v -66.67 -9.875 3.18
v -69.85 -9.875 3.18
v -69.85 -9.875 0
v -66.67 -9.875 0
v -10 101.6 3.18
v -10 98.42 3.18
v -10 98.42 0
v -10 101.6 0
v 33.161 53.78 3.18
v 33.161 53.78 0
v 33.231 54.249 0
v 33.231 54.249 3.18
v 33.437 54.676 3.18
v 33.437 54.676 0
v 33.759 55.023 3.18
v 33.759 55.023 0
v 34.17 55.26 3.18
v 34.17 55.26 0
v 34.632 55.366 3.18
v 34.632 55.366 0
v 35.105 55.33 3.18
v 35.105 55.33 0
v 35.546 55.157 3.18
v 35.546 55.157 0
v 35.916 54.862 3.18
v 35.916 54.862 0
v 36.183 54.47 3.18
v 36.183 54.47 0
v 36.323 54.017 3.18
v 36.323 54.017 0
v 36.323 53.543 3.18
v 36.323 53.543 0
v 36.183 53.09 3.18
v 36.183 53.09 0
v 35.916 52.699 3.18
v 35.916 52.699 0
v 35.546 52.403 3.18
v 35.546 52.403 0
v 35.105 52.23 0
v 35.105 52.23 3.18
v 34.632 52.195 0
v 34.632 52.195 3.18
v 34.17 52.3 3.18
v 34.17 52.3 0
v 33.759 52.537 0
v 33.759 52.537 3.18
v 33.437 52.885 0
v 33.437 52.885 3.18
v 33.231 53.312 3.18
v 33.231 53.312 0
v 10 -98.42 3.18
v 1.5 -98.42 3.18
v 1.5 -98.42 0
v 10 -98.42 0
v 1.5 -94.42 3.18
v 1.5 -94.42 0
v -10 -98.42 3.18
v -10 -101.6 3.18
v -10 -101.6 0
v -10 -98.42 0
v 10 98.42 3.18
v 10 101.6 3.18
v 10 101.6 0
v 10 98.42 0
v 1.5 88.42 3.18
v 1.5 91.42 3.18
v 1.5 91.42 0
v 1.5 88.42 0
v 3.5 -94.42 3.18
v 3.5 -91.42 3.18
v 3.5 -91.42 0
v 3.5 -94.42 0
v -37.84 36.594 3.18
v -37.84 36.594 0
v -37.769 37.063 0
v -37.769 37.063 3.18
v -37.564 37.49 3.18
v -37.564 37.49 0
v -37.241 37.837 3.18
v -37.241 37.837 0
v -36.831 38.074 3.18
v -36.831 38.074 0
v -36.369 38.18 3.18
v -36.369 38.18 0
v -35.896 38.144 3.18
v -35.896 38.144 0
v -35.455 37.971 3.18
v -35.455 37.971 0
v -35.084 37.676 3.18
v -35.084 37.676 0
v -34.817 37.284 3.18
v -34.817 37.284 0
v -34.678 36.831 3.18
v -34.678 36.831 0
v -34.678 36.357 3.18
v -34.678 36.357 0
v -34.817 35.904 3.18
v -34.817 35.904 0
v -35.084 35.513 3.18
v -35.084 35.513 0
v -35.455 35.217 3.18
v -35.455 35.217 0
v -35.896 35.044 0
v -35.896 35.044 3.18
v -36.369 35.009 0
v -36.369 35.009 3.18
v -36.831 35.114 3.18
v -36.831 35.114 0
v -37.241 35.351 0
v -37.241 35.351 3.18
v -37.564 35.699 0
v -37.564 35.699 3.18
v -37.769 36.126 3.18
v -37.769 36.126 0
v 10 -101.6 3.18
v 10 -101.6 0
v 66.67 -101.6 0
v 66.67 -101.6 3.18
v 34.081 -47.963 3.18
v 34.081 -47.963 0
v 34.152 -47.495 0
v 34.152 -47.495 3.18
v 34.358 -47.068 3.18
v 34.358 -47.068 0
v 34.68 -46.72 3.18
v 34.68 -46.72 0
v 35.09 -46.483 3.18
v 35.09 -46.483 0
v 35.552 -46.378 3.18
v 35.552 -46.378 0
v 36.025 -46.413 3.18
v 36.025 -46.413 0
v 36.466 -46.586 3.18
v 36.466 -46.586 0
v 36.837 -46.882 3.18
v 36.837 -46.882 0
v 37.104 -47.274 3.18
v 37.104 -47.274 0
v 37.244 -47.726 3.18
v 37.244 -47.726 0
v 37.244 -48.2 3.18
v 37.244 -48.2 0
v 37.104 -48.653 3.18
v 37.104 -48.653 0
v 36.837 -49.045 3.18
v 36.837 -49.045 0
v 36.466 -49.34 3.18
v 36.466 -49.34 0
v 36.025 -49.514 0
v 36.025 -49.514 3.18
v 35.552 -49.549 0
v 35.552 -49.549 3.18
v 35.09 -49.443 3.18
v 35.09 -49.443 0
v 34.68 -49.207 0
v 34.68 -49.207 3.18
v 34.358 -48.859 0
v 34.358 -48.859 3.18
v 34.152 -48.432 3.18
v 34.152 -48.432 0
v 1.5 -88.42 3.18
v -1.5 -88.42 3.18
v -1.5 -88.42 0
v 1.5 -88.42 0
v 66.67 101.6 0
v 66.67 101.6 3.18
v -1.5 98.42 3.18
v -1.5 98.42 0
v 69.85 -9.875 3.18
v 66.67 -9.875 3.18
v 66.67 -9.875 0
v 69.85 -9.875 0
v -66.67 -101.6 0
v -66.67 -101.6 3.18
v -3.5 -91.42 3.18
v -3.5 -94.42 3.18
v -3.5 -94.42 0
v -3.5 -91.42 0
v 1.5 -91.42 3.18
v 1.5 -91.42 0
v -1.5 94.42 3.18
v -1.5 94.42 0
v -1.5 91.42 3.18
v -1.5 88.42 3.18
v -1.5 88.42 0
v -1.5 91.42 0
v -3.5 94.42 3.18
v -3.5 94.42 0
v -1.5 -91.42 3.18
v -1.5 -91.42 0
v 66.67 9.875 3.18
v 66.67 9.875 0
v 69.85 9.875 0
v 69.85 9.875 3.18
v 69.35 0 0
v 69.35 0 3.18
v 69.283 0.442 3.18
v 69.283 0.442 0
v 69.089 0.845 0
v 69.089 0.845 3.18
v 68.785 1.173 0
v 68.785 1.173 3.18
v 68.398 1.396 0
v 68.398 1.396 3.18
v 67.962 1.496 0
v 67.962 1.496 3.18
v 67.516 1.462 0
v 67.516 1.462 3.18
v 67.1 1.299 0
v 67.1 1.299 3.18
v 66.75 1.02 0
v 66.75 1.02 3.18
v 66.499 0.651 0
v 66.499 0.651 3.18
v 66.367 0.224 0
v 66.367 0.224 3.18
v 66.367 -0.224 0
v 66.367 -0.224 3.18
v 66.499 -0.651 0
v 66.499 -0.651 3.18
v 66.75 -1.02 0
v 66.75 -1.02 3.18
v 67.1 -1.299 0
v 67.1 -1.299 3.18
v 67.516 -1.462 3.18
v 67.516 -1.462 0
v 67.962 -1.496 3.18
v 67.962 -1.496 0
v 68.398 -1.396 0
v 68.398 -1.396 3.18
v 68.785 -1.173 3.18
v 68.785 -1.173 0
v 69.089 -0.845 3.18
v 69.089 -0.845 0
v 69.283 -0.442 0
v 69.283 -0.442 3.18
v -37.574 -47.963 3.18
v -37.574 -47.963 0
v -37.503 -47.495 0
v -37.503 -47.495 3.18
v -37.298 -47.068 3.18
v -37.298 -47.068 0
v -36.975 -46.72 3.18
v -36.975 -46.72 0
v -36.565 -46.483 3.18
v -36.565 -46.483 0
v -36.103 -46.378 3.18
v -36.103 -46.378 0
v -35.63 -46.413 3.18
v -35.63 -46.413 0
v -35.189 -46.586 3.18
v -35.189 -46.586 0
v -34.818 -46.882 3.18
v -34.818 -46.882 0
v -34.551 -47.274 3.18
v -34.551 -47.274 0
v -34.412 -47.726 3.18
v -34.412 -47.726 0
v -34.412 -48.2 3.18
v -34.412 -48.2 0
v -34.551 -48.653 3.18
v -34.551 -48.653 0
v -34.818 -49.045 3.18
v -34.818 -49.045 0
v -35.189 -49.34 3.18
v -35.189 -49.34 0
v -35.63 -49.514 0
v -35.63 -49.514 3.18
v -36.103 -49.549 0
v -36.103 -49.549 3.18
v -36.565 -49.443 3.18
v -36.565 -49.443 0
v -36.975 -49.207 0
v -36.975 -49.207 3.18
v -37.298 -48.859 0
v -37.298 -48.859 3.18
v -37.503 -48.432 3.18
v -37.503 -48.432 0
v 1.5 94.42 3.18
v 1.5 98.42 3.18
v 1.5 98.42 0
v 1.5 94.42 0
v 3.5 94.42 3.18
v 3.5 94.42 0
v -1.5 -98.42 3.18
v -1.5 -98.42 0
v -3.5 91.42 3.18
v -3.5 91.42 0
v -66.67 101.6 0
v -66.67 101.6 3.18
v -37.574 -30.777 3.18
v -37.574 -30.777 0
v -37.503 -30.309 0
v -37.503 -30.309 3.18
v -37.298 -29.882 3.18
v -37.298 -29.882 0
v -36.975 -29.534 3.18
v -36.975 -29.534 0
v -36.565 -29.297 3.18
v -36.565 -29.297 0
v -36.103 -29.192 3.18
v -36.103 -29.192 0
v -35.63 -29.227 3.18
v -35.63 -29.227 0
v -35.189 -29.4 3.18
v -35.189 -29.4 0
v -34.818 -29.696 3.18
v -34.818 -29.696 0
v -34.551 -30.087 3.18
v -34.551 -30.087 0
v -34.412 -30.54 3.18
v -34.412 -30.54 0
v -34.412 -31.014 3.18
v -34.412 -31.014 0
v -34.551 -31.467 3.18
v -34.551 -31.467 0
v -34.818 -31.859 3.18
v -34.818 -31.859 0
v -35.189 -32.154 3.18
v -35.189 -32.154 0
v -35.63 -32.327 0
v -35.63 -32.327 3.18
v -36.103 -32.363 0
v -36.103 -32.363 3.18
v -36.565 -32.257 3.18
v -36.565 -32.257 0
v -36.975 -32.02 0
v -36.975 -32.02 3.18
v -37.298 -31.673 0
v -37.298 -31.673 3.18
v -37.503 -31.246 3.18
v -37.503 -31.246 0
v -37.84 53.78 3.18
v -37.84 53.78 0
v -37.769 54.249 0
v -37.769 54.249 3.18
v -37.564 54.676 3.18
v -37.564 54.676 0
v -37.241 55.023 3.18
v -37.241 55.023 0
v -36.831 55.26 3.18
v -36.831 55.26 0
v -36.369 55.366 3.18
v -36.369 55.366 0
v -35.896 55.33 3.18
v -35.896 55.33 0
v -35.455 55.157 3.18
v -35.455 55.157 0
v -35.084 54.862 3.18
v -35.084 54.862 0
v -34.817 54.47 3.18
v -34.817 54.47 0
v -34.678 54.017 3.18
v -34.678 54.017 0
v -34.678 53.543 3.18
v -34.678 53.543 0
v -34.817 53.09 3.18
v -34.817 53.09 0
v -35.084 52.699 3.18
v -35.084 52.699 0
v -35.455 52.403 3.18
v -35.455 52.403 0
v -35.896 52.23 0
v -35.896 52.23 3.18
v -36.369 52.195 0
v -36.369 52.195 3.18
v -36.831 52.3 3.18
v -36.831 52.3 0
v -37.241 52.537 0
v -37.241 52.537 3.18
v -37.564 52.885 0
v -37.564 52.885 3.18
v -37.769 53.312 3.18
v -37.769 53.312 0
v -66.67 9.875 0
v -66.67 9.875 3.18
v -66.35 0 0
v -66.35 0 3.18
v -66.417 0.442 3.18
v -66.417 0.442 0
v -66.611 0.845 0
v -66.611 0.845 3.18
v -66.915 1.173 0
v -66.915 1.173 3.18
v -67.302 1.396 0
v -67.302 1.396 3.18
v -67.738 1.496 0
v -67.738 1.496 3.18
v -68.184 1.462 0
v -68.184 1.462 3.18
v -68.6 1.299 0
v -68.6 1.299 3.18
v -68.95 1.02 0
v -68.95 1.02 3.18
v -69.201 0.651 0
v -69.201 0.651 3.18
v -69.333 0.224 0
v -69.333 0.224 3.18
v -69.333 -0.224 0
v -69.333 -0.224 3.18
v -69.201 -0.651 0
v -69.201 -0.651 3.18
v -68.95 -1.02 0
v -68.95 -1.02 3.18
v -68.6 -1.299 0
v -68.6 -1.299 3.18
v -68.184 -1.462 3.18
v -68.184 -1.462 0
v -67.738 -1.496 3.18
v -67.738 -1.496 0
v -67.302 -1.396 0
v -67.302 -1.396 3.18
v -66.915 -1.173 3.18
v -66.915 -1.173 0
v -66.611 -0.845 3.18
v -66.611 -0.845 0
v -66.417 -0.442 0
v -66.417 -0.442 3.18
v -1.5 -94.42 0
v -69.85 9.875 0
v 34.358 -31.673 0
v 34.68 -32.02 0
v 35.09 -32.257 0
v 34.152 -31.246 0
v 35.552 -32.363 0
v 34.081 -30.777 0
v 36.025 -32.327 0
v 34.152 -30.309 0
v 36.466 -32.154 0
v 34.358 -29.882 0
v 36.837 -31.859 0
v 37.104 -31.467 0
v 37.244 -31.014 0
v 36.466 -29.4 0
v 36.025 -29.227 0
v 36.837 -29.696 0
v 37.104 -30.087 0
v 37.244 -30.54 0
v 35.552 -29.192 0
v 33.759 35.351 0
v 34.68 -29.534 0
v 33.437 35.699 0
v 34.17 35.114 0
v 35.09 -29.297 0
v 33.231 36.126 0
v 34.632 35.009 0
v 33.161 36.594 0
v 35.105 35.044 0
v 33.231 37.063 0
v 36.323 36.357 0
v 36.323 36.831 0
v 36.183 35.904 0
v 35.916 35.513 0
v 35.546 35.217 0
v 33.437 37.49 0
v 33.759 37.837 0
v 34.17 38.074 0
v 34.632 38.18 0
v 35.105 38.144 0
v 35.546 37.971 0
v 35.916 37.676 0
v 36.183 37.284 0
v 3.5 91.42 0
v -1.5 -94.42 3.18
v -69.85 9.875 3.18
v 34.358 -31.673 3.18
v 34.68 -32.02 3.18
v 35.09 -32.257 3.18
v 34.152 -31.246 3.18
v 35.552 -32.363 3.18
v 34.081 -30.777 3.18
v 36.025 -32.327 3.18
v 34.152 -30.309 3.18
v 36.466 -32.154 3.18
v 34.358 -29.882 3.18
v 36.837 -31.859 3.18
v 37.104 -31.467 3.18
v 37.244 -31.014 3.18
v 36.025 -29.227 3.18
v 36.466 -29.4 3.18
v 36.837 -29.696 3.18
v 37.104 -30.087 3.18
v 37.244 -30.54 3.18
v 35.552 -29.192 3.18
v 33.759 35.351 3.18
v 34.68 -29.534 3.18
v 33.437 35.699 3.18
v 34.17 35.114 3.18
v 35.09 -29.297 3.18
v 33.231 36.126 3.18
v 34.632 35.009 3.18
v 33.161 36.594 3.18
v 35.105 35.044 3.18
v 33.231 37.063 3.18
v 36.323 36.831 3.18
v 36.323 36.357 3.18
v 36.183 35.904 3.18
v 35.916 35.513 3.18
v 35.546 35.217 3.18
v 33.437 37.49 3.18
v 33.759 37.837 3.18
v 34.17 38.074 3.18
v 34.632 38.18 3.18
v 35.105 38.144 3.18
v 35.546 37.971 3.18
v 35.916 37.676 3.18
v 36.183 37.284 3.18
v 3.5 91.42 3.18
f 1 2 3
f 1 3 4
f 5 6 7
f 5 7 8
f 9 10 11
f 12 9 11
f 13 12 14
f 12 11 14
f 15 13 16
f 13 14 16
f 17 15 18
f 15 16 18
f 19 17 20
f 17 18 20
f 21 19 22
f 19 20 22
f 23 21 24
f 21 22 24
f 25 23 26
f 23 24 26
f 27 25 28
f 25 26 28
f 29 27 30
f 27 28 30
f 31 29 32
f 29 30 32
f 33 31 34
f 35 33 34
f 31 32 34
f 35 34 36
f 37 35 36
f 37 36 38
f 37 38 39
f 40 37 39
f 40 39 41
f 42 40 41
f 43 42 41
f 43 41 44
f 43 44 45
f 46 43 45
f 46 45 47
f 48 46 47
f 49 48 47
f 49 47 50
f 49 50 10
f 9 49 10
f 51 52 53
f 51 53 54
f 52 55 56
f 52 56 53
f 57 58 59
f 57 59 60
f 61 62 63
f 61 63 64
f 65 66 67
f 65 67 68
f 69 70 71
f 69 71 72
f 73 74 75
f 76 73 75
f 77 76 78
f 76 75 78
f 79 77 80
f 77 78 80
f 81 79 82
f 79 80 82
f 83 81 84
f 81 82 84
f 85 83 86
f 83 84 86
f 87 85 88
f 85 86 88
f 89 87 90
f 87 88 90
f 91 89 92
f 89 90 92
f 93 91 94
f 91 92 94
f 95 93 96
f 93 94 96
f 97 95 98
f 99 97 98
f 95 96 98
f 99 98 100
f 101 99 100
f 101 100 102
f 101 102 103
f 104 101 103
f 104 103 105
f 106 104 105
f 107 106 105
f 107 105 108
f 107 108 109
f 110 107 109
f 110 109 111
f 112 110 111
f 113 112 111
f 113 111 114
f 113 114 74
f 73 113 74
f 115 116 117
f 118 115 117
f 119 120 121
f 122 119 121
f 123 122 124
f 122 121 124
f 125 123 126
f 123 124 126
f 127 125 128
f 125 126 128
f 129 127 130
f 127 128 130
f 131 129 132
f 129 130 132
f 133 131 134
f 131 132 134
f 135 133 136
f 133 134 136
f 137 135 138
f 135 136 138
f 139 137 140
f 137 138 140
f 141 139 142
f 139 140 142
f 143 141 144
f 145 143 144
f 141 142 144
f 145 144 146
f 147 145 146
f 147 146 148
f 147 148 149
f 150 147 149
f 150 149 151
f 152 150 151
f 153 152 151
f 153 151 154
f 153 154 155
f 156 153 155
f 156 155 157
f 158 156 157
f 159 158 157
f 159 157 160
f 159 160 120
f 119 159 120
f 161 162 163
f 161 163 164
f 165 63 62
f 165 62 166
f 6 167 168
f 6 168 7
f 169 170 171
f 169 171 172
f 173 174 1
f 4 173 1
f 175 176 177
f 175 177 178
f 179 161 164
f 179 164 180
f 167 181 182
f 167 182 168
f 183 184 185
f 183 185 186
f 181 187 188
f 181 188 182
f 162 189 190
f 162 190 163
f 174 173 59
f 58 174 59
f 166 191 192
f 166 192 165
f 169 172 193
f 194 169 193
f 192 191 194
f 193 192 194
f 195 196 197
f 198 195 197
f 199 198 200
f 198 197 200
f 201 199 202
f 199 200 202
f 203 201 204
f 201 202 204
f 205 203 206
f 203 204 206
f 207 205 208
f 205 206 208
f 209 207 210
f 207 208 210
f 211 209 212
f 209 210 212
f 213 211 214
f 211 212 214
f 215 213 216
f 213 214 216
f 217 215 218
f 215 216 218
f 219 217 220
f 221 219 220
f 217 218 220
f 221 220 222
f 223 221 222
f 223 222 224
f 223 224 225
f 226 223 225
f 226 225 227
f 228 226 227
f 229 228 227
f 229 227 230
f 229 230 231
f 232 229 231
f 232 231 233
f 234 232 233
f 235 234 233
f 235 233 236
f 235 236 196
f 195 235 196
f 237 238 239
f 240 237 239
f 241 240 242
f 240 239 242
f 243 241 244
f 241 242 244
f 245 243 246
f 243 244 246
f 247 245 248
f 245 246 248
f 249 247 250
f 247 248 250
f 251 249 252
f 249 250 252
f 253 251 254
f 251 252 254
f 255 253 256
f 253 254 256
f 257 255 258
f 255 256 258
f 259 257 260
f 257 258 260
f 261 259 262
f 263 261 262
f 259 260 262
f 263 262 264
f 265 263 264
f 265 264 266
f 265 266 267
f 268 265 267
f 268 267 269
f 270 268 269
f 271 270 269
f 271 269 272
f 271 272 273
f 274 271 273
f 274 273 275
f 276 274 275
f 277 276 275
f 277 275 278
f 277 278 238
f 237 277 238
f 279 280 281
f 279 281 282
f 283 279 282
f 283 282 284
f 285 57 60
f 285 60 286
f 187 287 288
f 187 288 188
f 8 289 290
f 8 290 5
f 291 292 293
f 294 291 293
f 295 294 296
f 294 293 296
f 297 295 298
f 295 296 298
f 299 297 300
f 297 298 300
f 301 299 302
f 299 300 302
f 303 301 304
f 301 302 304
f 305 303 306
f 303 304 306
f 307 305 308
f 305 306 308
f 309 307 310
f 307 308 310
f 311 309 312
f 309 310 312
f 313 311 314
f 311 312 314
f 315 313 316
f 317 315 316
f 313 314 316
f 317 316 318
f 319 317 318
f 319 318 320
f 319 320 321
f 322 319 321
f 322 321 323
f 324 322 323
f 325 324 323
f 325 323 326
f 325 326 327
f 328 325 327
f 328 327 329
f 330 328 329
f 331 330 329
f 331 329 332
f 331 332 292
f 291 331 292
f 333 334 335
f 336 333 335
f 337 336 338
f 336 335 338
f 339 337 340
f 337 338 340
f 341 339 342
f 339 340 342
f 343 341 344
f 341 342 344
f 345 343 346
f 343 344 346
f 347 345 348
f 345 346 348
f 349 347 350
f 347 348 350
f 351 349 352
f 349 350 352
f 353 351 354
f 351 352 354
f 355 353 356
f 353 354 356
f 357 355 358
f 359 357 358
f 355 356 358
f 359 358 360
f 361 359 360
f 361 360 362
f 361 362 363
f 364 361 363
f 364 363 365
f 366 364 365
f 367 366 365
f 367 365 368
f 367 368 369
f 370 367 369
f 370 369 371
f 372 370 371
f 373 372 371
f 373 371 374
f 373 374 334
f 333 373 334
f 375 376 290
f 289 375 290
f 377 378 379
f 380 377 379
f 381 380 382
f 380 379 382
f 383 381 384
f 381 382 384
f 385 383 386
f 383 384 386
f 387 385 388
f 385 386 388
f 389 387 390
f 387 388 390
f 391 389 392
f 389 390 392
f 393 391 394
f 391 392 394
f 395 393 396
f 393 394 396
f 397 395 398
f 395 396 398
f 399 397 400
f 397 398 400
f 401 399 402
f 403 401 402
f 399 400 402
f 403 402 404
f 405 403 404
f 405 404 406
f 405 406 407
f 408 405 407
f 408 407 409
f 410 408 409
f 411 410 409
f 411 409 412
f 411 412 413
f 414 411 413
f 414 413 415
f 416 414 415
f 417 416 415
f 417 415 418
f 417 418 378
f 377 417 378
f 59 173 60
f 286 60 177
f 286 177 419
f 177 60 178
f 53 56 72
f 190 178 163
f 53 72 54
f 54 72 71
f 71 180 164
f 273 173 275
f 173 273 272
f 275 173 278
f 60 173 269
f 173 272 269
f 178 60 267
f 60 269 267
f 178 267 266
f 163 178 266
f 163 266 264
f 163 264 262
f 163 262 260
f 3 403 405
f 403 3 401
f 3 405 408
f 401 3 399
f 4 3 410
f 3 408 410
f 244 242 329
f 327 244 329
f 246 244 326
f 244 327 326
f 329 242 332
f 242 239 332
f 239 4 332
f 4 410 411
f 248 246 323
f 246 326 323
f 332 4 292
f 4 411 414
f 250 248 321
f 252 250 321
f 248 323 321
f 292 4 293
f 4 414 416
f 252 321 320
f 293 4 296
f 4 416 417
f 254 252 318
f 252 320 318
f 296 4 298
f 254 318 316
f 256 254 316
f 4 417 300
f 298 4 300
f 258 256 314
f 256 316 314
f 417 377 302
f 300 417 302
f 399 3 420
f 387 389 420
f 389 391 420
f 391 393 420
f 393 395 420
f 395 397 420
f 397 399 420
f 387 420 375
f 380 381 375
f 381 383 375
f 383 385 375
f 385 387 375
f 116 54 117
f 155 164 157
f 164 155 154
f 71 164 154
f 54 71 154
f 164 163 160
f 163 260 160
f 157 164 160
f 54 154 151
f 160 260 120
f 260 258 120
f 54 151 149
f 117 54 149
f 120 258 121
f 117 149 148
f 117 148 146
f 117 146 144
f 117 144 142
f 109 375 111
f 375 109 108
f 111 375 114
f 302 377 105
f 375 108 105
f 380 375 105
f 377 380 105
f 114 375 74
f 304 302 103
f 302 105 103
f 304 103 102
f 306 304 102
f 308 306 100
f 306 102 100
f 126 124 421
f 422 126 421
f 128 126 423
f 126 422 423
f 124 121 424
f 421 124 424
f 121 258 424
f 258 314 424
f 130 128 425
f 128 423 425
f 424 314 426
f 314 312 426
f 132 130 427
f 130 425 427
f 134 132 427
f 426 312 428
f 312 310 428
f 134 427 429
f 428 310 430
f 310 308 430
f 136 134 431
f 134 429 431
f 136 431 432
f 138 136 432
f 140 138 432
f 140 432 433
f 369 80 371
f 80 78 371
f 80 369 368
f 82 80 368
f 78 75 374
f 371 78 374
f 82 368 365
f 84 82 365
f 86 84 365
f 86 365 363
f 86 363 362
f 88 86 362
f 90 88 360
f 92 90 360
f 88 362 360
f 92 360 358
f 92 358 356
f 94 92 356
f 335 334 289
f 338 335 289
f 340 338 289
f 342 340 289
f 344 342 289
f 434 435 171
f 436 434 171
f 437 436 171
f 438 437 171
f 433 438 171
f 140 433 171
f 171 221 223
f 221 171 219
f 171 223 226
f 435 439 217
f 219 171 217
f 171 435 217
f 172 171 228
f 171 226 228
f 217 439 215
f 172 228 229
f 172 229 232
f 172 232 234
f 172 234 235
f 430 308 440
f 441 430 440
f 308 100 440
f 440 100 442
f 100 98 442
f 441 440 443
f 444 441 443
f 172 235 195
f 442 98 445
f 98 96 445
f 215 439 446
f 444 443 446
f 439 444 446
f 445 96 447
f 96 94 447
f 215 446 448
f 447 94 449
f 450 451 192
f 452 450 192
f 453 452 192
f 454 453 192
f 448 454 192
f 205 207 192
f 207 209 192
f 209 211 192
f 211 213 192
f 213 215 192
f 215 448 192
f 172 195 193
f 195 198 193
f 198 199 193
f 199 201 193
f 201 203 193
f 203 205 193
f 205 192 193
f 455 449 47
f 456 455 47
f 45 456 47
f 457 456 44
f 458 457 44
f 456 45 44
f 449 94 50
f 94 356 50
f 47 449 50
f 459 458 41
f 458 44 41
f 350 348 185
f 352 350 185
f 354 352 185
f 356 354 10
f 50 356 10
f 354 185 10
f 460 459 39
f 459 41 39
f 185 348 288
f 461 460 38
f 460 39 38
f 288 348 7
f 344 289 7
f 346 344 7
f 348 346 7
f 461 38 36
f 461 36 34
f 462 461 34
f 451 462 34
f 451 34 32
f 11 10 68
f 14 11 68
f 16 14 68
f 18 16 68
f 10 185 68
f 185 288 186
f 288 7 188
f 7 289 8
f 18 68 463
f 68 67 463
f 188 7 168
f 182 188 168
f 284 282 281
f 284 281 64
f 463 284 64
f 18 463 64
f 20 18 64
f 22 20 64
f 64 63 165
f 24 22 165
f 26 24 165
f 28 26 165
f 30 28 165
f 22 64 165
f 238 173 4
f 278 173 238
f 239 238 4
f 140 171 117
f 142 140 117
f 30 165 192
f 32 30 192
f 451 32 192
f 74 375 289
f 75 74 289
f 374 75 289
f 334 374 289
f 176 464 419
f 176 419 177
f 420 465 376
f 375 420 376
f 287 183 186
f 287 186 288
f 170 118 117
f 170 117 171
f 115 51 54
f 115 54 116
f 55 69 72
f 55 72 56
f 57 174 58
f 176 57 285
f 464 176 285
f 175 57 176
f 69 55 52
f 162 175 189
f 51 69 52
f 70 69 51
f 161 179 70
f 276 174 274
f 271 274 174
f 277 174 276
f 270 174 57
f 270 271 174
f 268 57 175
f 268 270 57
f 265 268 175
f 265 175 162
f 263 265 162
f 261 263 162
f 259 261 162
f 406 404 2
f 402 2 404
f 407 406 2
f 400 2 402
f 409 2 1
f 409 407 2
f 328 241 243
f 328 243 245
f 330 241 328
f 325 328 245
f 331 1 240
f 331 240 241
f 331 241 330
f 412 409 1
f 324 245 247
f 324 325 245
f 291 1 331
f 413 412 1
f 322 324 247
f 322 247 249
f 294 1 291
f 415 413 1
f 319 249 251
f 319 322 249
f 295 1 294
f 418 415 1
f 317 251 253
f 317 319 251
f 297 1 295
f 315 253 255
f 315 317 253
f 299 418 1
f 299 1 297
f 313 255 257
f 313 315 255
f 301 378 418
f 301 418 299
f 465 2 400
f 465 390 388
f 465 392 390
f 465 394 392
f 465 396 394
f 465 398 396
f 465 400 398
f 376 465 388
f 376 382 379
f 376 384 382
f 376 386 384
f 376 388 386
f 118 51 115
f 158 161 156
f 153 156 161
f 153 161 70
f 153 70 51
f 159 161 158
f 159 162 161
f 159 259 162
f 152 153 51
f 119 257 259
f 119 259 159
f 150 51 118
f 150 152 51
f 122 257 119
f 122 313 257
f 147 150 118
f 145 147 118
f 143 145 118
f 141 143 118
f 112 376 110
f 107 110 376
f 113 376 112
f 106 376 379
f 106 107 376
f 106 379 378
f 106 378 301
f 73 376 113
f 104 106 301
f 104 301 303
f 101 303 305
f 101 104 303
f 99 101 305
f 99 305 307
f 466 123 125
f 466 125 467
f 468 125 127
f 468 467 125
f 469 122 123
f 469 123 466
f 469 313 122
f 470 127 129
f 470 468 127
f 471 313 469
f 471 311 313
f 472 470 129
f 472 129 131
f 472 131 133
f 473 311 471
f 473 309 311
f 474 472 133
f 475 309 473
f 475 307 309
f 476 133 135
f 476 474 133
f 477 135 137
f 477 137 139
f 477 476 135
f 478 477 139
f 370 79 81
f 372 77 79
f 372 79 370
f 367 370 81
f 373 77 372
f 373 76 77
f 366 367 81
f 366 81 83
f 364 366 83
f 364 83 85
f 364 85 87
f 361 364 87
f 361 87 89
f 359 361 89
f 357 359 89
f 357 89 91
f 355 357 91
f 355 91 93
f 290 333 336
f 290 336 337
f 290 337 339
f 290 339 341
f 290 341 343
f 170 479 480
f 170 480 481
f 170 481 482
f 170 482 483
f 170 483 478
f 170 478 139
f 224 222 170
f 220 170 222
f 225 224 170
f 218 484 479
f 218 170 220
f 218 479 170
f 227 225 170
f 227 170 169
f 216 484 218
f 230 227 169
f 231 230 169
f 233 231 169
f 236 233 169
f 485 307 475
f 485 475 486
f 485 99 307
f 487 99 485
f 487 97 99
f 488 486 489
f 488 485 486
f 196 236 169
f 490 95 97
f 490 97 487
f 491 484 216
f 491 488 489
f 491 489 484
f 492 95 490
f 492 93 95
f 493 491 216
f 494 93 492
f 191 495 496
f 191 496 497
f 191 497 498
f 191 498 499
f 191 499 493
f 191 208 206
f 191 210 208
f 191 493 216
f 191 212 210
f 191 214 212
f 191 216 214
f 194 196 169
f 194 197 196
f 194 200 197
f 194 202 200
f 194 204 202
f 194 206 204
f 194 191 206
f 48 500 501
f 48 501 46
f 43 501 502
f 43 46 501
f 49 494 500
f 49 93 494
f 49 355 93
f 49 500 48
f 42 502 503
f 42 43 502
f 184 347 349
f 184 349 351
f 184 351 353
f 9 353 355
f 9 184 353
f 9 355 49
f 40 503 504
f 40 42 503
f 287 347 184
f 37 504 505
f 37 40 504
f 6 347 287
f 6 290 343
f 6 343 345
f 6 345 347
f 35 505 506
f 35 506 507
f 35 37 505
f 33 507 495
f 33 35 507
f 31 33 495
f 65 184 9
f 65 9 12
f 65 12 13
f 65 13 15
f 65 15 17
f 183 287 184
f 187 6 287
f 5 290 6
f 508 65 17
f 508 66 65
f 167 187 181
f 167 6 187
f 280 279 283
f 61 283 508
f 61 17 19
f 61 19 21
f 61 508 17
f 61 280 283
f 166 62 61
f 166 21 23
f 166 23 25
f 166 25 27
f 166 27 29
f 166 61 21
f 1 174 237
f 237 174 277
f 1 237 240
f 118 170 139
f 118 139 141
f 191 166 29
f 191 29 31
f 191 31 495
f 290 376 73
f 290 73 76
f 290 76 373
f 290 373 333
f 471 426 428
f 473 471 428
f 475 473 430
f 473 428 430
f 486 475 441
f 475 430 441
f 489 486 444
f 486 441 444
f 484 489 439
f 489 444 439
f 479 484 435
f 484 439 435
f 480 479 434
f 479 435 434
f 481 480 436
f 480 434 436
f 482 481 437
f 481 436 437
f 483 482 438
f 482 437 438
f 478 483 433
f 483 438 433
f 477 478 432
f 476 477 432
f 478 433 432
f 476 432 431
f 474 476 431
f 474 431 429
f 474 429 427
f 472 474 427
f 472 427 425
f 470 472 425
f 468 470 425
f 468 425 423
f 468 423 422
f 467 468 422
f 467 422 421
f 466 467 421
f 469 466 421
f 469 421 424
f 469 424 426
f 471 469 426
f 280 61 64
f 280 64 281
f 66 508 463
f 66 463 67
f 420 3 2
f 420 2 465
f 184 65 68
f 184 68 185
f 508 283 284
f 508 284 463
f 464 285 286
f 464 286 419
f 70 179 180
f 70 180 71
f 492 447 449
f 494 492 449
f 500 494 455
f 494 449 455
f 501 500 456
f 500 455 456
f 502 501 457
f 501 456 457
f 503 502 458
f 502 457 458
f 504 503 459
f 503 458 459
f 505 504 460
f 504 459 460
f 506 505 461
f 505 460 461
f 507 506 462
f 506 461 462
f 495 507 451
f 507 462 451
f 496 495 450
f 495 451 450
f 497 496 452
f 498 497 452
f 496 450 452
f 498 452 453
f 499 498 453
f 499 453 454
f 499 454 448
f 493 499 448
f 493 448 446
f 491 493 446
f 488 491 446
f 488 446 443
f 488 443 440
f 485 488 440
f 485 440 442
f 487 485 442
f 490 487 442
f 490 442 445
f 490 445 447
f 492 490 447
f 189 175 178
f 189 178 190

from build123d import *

# Parameters (mm, degrees)
SKETCH1_W           = 139.7
SKETCH1_H           = 203.2
BOSS_EXTRUDE1_DEPTH = 3.18
SKETCH2_R           = 1.5
SKETCH2_W           = 3.18
SKETCH2_H           = 91.725
CUT_EXTRUDE1_DEPTH  = 4.18
SKETCH3_R           = 1.59
CUT_EXTRUDE2_DEPTH  = 4.18
SKETCH4_R           = 1.59
CUT_EXTRUDE3_DEPTH  = 4.18


with BuildPart() as part:
    # Sketch1 → Boss-Extrude1 (new body)
    with BuildSketch(Plane.XY):
        Rectangle(SKETCH1_W, SKETCH1_H)
    extrude(amount=BOSS_EXTRUDE1_DEPTH)

    # Sketch2 → Cut-Extrude1 (cut, through all)
    with BuildSketch(Plane.XY.offset(3.18)):
        with Locations((-67.85, 0)):
            Circle(SKETCH2_R)
        with Locations((67.85, 0)):
            Circle(SKETCH2_R)
        Polygon((-10, 101.6), (10, 101.6), (10, 98.42), (1.5, 98.42), (1.5, 94.42), (3.5, 94.42), (3.5, 91.42), (1.5, 91.42), (1.5, 88.42), (-1.5, 88.42), (-1.5, 91.42), (-3.5, 91.42), (-3.5, 94.42), (-1.5, 94.42), (-1.5, 98.42), (-10, 98.42), align=None)
        Polygon((-10, -101.6), (-10, -98.42), (-1.5, -98.42), (-1.5, -94.42), (-3.5, -94.42), (-3.5, -91.42), (-1.5, -91.42), (-1.5, -88.42), (1.5, -88.42), (1.5, -91.42), (3.5, -91.42), (3.5, -94.42), (1.5, -94.42), (1.5, -98.42), (10, -98.42), (10, -101.6), align=None)
        with Locations((-68.26, 55.7375)):
            Rectangle(SKETCH2_W, SKETCH2_H)
        with Locations((-68.26, -55.7375)):
            Rectangle(SKETCH2_W, SKETCH2_H)
        with Locations((68.26, -55.7375)):
            Rectangle(SKETCH2_W, SKETCH2_H)
        with Locations((68.26, 55.7375)):
            Rectangle(SKETCH2_W, SKETCH2_H)
    extrude(amount=-CUT_EXTRUDE1_DEPTH, mode=Mode.SUBTRACT)

    # Sketch3 → Cut-Extrude2 (cut, through all)
    with BuildSketch(Plane(origin=(0, 0, 0), x_dir=(-1, 0, 0), z_dir=(0, 0, -1))):
        with Locations((-35.67127699, -47.963396943)):
            Circle(SKETCH3_R)
        with Locations((-35.67127699, -30.777287406)):
            Circle(SKETCH3_R)
    extrude(amount=-CUT_EXTRUDE2_DEPTH, mode=Mode.SUBTRACT)

    # Sketch4 → Cut-Extrude3 (cut, through all)
    with BuildSketch(Plane(origin=(0, 0, 0), x_dir=(-1, 0, 0), z_dir=(0, 0, -1))):
        with Locations((-34.750723073, 53.780323187)):
            Circle(SKETCH4_R)
        with Locations((-34.750723073, 36.59421365)):
            Circle(SKETCH4_R)
        with Locations((36.249784221, 53.780323187)):
            Circle(SKETCH4_R)
        with Locations((36.249784221, 36.59421365)):
            Circle(SKETCH4_R)
        with Locations((35.983928162, -30.777287406)):
            Circle(SKETCH4_R)
        with Locations((35.983928162, -47.963396943)):
            Circle(SKETCH4_R)
        with Locations((-35.67127699, -30.777287406)):
            Circle(SKETCH4_R)
        with Locations((-35.67127699, -47.963396943)):
            Circle(SKETCH4_R)
    extrude(amount=-CUT_EXTRUDE3_DEPTH, mode=Mode.SUBTRACT)


solid = part.part
